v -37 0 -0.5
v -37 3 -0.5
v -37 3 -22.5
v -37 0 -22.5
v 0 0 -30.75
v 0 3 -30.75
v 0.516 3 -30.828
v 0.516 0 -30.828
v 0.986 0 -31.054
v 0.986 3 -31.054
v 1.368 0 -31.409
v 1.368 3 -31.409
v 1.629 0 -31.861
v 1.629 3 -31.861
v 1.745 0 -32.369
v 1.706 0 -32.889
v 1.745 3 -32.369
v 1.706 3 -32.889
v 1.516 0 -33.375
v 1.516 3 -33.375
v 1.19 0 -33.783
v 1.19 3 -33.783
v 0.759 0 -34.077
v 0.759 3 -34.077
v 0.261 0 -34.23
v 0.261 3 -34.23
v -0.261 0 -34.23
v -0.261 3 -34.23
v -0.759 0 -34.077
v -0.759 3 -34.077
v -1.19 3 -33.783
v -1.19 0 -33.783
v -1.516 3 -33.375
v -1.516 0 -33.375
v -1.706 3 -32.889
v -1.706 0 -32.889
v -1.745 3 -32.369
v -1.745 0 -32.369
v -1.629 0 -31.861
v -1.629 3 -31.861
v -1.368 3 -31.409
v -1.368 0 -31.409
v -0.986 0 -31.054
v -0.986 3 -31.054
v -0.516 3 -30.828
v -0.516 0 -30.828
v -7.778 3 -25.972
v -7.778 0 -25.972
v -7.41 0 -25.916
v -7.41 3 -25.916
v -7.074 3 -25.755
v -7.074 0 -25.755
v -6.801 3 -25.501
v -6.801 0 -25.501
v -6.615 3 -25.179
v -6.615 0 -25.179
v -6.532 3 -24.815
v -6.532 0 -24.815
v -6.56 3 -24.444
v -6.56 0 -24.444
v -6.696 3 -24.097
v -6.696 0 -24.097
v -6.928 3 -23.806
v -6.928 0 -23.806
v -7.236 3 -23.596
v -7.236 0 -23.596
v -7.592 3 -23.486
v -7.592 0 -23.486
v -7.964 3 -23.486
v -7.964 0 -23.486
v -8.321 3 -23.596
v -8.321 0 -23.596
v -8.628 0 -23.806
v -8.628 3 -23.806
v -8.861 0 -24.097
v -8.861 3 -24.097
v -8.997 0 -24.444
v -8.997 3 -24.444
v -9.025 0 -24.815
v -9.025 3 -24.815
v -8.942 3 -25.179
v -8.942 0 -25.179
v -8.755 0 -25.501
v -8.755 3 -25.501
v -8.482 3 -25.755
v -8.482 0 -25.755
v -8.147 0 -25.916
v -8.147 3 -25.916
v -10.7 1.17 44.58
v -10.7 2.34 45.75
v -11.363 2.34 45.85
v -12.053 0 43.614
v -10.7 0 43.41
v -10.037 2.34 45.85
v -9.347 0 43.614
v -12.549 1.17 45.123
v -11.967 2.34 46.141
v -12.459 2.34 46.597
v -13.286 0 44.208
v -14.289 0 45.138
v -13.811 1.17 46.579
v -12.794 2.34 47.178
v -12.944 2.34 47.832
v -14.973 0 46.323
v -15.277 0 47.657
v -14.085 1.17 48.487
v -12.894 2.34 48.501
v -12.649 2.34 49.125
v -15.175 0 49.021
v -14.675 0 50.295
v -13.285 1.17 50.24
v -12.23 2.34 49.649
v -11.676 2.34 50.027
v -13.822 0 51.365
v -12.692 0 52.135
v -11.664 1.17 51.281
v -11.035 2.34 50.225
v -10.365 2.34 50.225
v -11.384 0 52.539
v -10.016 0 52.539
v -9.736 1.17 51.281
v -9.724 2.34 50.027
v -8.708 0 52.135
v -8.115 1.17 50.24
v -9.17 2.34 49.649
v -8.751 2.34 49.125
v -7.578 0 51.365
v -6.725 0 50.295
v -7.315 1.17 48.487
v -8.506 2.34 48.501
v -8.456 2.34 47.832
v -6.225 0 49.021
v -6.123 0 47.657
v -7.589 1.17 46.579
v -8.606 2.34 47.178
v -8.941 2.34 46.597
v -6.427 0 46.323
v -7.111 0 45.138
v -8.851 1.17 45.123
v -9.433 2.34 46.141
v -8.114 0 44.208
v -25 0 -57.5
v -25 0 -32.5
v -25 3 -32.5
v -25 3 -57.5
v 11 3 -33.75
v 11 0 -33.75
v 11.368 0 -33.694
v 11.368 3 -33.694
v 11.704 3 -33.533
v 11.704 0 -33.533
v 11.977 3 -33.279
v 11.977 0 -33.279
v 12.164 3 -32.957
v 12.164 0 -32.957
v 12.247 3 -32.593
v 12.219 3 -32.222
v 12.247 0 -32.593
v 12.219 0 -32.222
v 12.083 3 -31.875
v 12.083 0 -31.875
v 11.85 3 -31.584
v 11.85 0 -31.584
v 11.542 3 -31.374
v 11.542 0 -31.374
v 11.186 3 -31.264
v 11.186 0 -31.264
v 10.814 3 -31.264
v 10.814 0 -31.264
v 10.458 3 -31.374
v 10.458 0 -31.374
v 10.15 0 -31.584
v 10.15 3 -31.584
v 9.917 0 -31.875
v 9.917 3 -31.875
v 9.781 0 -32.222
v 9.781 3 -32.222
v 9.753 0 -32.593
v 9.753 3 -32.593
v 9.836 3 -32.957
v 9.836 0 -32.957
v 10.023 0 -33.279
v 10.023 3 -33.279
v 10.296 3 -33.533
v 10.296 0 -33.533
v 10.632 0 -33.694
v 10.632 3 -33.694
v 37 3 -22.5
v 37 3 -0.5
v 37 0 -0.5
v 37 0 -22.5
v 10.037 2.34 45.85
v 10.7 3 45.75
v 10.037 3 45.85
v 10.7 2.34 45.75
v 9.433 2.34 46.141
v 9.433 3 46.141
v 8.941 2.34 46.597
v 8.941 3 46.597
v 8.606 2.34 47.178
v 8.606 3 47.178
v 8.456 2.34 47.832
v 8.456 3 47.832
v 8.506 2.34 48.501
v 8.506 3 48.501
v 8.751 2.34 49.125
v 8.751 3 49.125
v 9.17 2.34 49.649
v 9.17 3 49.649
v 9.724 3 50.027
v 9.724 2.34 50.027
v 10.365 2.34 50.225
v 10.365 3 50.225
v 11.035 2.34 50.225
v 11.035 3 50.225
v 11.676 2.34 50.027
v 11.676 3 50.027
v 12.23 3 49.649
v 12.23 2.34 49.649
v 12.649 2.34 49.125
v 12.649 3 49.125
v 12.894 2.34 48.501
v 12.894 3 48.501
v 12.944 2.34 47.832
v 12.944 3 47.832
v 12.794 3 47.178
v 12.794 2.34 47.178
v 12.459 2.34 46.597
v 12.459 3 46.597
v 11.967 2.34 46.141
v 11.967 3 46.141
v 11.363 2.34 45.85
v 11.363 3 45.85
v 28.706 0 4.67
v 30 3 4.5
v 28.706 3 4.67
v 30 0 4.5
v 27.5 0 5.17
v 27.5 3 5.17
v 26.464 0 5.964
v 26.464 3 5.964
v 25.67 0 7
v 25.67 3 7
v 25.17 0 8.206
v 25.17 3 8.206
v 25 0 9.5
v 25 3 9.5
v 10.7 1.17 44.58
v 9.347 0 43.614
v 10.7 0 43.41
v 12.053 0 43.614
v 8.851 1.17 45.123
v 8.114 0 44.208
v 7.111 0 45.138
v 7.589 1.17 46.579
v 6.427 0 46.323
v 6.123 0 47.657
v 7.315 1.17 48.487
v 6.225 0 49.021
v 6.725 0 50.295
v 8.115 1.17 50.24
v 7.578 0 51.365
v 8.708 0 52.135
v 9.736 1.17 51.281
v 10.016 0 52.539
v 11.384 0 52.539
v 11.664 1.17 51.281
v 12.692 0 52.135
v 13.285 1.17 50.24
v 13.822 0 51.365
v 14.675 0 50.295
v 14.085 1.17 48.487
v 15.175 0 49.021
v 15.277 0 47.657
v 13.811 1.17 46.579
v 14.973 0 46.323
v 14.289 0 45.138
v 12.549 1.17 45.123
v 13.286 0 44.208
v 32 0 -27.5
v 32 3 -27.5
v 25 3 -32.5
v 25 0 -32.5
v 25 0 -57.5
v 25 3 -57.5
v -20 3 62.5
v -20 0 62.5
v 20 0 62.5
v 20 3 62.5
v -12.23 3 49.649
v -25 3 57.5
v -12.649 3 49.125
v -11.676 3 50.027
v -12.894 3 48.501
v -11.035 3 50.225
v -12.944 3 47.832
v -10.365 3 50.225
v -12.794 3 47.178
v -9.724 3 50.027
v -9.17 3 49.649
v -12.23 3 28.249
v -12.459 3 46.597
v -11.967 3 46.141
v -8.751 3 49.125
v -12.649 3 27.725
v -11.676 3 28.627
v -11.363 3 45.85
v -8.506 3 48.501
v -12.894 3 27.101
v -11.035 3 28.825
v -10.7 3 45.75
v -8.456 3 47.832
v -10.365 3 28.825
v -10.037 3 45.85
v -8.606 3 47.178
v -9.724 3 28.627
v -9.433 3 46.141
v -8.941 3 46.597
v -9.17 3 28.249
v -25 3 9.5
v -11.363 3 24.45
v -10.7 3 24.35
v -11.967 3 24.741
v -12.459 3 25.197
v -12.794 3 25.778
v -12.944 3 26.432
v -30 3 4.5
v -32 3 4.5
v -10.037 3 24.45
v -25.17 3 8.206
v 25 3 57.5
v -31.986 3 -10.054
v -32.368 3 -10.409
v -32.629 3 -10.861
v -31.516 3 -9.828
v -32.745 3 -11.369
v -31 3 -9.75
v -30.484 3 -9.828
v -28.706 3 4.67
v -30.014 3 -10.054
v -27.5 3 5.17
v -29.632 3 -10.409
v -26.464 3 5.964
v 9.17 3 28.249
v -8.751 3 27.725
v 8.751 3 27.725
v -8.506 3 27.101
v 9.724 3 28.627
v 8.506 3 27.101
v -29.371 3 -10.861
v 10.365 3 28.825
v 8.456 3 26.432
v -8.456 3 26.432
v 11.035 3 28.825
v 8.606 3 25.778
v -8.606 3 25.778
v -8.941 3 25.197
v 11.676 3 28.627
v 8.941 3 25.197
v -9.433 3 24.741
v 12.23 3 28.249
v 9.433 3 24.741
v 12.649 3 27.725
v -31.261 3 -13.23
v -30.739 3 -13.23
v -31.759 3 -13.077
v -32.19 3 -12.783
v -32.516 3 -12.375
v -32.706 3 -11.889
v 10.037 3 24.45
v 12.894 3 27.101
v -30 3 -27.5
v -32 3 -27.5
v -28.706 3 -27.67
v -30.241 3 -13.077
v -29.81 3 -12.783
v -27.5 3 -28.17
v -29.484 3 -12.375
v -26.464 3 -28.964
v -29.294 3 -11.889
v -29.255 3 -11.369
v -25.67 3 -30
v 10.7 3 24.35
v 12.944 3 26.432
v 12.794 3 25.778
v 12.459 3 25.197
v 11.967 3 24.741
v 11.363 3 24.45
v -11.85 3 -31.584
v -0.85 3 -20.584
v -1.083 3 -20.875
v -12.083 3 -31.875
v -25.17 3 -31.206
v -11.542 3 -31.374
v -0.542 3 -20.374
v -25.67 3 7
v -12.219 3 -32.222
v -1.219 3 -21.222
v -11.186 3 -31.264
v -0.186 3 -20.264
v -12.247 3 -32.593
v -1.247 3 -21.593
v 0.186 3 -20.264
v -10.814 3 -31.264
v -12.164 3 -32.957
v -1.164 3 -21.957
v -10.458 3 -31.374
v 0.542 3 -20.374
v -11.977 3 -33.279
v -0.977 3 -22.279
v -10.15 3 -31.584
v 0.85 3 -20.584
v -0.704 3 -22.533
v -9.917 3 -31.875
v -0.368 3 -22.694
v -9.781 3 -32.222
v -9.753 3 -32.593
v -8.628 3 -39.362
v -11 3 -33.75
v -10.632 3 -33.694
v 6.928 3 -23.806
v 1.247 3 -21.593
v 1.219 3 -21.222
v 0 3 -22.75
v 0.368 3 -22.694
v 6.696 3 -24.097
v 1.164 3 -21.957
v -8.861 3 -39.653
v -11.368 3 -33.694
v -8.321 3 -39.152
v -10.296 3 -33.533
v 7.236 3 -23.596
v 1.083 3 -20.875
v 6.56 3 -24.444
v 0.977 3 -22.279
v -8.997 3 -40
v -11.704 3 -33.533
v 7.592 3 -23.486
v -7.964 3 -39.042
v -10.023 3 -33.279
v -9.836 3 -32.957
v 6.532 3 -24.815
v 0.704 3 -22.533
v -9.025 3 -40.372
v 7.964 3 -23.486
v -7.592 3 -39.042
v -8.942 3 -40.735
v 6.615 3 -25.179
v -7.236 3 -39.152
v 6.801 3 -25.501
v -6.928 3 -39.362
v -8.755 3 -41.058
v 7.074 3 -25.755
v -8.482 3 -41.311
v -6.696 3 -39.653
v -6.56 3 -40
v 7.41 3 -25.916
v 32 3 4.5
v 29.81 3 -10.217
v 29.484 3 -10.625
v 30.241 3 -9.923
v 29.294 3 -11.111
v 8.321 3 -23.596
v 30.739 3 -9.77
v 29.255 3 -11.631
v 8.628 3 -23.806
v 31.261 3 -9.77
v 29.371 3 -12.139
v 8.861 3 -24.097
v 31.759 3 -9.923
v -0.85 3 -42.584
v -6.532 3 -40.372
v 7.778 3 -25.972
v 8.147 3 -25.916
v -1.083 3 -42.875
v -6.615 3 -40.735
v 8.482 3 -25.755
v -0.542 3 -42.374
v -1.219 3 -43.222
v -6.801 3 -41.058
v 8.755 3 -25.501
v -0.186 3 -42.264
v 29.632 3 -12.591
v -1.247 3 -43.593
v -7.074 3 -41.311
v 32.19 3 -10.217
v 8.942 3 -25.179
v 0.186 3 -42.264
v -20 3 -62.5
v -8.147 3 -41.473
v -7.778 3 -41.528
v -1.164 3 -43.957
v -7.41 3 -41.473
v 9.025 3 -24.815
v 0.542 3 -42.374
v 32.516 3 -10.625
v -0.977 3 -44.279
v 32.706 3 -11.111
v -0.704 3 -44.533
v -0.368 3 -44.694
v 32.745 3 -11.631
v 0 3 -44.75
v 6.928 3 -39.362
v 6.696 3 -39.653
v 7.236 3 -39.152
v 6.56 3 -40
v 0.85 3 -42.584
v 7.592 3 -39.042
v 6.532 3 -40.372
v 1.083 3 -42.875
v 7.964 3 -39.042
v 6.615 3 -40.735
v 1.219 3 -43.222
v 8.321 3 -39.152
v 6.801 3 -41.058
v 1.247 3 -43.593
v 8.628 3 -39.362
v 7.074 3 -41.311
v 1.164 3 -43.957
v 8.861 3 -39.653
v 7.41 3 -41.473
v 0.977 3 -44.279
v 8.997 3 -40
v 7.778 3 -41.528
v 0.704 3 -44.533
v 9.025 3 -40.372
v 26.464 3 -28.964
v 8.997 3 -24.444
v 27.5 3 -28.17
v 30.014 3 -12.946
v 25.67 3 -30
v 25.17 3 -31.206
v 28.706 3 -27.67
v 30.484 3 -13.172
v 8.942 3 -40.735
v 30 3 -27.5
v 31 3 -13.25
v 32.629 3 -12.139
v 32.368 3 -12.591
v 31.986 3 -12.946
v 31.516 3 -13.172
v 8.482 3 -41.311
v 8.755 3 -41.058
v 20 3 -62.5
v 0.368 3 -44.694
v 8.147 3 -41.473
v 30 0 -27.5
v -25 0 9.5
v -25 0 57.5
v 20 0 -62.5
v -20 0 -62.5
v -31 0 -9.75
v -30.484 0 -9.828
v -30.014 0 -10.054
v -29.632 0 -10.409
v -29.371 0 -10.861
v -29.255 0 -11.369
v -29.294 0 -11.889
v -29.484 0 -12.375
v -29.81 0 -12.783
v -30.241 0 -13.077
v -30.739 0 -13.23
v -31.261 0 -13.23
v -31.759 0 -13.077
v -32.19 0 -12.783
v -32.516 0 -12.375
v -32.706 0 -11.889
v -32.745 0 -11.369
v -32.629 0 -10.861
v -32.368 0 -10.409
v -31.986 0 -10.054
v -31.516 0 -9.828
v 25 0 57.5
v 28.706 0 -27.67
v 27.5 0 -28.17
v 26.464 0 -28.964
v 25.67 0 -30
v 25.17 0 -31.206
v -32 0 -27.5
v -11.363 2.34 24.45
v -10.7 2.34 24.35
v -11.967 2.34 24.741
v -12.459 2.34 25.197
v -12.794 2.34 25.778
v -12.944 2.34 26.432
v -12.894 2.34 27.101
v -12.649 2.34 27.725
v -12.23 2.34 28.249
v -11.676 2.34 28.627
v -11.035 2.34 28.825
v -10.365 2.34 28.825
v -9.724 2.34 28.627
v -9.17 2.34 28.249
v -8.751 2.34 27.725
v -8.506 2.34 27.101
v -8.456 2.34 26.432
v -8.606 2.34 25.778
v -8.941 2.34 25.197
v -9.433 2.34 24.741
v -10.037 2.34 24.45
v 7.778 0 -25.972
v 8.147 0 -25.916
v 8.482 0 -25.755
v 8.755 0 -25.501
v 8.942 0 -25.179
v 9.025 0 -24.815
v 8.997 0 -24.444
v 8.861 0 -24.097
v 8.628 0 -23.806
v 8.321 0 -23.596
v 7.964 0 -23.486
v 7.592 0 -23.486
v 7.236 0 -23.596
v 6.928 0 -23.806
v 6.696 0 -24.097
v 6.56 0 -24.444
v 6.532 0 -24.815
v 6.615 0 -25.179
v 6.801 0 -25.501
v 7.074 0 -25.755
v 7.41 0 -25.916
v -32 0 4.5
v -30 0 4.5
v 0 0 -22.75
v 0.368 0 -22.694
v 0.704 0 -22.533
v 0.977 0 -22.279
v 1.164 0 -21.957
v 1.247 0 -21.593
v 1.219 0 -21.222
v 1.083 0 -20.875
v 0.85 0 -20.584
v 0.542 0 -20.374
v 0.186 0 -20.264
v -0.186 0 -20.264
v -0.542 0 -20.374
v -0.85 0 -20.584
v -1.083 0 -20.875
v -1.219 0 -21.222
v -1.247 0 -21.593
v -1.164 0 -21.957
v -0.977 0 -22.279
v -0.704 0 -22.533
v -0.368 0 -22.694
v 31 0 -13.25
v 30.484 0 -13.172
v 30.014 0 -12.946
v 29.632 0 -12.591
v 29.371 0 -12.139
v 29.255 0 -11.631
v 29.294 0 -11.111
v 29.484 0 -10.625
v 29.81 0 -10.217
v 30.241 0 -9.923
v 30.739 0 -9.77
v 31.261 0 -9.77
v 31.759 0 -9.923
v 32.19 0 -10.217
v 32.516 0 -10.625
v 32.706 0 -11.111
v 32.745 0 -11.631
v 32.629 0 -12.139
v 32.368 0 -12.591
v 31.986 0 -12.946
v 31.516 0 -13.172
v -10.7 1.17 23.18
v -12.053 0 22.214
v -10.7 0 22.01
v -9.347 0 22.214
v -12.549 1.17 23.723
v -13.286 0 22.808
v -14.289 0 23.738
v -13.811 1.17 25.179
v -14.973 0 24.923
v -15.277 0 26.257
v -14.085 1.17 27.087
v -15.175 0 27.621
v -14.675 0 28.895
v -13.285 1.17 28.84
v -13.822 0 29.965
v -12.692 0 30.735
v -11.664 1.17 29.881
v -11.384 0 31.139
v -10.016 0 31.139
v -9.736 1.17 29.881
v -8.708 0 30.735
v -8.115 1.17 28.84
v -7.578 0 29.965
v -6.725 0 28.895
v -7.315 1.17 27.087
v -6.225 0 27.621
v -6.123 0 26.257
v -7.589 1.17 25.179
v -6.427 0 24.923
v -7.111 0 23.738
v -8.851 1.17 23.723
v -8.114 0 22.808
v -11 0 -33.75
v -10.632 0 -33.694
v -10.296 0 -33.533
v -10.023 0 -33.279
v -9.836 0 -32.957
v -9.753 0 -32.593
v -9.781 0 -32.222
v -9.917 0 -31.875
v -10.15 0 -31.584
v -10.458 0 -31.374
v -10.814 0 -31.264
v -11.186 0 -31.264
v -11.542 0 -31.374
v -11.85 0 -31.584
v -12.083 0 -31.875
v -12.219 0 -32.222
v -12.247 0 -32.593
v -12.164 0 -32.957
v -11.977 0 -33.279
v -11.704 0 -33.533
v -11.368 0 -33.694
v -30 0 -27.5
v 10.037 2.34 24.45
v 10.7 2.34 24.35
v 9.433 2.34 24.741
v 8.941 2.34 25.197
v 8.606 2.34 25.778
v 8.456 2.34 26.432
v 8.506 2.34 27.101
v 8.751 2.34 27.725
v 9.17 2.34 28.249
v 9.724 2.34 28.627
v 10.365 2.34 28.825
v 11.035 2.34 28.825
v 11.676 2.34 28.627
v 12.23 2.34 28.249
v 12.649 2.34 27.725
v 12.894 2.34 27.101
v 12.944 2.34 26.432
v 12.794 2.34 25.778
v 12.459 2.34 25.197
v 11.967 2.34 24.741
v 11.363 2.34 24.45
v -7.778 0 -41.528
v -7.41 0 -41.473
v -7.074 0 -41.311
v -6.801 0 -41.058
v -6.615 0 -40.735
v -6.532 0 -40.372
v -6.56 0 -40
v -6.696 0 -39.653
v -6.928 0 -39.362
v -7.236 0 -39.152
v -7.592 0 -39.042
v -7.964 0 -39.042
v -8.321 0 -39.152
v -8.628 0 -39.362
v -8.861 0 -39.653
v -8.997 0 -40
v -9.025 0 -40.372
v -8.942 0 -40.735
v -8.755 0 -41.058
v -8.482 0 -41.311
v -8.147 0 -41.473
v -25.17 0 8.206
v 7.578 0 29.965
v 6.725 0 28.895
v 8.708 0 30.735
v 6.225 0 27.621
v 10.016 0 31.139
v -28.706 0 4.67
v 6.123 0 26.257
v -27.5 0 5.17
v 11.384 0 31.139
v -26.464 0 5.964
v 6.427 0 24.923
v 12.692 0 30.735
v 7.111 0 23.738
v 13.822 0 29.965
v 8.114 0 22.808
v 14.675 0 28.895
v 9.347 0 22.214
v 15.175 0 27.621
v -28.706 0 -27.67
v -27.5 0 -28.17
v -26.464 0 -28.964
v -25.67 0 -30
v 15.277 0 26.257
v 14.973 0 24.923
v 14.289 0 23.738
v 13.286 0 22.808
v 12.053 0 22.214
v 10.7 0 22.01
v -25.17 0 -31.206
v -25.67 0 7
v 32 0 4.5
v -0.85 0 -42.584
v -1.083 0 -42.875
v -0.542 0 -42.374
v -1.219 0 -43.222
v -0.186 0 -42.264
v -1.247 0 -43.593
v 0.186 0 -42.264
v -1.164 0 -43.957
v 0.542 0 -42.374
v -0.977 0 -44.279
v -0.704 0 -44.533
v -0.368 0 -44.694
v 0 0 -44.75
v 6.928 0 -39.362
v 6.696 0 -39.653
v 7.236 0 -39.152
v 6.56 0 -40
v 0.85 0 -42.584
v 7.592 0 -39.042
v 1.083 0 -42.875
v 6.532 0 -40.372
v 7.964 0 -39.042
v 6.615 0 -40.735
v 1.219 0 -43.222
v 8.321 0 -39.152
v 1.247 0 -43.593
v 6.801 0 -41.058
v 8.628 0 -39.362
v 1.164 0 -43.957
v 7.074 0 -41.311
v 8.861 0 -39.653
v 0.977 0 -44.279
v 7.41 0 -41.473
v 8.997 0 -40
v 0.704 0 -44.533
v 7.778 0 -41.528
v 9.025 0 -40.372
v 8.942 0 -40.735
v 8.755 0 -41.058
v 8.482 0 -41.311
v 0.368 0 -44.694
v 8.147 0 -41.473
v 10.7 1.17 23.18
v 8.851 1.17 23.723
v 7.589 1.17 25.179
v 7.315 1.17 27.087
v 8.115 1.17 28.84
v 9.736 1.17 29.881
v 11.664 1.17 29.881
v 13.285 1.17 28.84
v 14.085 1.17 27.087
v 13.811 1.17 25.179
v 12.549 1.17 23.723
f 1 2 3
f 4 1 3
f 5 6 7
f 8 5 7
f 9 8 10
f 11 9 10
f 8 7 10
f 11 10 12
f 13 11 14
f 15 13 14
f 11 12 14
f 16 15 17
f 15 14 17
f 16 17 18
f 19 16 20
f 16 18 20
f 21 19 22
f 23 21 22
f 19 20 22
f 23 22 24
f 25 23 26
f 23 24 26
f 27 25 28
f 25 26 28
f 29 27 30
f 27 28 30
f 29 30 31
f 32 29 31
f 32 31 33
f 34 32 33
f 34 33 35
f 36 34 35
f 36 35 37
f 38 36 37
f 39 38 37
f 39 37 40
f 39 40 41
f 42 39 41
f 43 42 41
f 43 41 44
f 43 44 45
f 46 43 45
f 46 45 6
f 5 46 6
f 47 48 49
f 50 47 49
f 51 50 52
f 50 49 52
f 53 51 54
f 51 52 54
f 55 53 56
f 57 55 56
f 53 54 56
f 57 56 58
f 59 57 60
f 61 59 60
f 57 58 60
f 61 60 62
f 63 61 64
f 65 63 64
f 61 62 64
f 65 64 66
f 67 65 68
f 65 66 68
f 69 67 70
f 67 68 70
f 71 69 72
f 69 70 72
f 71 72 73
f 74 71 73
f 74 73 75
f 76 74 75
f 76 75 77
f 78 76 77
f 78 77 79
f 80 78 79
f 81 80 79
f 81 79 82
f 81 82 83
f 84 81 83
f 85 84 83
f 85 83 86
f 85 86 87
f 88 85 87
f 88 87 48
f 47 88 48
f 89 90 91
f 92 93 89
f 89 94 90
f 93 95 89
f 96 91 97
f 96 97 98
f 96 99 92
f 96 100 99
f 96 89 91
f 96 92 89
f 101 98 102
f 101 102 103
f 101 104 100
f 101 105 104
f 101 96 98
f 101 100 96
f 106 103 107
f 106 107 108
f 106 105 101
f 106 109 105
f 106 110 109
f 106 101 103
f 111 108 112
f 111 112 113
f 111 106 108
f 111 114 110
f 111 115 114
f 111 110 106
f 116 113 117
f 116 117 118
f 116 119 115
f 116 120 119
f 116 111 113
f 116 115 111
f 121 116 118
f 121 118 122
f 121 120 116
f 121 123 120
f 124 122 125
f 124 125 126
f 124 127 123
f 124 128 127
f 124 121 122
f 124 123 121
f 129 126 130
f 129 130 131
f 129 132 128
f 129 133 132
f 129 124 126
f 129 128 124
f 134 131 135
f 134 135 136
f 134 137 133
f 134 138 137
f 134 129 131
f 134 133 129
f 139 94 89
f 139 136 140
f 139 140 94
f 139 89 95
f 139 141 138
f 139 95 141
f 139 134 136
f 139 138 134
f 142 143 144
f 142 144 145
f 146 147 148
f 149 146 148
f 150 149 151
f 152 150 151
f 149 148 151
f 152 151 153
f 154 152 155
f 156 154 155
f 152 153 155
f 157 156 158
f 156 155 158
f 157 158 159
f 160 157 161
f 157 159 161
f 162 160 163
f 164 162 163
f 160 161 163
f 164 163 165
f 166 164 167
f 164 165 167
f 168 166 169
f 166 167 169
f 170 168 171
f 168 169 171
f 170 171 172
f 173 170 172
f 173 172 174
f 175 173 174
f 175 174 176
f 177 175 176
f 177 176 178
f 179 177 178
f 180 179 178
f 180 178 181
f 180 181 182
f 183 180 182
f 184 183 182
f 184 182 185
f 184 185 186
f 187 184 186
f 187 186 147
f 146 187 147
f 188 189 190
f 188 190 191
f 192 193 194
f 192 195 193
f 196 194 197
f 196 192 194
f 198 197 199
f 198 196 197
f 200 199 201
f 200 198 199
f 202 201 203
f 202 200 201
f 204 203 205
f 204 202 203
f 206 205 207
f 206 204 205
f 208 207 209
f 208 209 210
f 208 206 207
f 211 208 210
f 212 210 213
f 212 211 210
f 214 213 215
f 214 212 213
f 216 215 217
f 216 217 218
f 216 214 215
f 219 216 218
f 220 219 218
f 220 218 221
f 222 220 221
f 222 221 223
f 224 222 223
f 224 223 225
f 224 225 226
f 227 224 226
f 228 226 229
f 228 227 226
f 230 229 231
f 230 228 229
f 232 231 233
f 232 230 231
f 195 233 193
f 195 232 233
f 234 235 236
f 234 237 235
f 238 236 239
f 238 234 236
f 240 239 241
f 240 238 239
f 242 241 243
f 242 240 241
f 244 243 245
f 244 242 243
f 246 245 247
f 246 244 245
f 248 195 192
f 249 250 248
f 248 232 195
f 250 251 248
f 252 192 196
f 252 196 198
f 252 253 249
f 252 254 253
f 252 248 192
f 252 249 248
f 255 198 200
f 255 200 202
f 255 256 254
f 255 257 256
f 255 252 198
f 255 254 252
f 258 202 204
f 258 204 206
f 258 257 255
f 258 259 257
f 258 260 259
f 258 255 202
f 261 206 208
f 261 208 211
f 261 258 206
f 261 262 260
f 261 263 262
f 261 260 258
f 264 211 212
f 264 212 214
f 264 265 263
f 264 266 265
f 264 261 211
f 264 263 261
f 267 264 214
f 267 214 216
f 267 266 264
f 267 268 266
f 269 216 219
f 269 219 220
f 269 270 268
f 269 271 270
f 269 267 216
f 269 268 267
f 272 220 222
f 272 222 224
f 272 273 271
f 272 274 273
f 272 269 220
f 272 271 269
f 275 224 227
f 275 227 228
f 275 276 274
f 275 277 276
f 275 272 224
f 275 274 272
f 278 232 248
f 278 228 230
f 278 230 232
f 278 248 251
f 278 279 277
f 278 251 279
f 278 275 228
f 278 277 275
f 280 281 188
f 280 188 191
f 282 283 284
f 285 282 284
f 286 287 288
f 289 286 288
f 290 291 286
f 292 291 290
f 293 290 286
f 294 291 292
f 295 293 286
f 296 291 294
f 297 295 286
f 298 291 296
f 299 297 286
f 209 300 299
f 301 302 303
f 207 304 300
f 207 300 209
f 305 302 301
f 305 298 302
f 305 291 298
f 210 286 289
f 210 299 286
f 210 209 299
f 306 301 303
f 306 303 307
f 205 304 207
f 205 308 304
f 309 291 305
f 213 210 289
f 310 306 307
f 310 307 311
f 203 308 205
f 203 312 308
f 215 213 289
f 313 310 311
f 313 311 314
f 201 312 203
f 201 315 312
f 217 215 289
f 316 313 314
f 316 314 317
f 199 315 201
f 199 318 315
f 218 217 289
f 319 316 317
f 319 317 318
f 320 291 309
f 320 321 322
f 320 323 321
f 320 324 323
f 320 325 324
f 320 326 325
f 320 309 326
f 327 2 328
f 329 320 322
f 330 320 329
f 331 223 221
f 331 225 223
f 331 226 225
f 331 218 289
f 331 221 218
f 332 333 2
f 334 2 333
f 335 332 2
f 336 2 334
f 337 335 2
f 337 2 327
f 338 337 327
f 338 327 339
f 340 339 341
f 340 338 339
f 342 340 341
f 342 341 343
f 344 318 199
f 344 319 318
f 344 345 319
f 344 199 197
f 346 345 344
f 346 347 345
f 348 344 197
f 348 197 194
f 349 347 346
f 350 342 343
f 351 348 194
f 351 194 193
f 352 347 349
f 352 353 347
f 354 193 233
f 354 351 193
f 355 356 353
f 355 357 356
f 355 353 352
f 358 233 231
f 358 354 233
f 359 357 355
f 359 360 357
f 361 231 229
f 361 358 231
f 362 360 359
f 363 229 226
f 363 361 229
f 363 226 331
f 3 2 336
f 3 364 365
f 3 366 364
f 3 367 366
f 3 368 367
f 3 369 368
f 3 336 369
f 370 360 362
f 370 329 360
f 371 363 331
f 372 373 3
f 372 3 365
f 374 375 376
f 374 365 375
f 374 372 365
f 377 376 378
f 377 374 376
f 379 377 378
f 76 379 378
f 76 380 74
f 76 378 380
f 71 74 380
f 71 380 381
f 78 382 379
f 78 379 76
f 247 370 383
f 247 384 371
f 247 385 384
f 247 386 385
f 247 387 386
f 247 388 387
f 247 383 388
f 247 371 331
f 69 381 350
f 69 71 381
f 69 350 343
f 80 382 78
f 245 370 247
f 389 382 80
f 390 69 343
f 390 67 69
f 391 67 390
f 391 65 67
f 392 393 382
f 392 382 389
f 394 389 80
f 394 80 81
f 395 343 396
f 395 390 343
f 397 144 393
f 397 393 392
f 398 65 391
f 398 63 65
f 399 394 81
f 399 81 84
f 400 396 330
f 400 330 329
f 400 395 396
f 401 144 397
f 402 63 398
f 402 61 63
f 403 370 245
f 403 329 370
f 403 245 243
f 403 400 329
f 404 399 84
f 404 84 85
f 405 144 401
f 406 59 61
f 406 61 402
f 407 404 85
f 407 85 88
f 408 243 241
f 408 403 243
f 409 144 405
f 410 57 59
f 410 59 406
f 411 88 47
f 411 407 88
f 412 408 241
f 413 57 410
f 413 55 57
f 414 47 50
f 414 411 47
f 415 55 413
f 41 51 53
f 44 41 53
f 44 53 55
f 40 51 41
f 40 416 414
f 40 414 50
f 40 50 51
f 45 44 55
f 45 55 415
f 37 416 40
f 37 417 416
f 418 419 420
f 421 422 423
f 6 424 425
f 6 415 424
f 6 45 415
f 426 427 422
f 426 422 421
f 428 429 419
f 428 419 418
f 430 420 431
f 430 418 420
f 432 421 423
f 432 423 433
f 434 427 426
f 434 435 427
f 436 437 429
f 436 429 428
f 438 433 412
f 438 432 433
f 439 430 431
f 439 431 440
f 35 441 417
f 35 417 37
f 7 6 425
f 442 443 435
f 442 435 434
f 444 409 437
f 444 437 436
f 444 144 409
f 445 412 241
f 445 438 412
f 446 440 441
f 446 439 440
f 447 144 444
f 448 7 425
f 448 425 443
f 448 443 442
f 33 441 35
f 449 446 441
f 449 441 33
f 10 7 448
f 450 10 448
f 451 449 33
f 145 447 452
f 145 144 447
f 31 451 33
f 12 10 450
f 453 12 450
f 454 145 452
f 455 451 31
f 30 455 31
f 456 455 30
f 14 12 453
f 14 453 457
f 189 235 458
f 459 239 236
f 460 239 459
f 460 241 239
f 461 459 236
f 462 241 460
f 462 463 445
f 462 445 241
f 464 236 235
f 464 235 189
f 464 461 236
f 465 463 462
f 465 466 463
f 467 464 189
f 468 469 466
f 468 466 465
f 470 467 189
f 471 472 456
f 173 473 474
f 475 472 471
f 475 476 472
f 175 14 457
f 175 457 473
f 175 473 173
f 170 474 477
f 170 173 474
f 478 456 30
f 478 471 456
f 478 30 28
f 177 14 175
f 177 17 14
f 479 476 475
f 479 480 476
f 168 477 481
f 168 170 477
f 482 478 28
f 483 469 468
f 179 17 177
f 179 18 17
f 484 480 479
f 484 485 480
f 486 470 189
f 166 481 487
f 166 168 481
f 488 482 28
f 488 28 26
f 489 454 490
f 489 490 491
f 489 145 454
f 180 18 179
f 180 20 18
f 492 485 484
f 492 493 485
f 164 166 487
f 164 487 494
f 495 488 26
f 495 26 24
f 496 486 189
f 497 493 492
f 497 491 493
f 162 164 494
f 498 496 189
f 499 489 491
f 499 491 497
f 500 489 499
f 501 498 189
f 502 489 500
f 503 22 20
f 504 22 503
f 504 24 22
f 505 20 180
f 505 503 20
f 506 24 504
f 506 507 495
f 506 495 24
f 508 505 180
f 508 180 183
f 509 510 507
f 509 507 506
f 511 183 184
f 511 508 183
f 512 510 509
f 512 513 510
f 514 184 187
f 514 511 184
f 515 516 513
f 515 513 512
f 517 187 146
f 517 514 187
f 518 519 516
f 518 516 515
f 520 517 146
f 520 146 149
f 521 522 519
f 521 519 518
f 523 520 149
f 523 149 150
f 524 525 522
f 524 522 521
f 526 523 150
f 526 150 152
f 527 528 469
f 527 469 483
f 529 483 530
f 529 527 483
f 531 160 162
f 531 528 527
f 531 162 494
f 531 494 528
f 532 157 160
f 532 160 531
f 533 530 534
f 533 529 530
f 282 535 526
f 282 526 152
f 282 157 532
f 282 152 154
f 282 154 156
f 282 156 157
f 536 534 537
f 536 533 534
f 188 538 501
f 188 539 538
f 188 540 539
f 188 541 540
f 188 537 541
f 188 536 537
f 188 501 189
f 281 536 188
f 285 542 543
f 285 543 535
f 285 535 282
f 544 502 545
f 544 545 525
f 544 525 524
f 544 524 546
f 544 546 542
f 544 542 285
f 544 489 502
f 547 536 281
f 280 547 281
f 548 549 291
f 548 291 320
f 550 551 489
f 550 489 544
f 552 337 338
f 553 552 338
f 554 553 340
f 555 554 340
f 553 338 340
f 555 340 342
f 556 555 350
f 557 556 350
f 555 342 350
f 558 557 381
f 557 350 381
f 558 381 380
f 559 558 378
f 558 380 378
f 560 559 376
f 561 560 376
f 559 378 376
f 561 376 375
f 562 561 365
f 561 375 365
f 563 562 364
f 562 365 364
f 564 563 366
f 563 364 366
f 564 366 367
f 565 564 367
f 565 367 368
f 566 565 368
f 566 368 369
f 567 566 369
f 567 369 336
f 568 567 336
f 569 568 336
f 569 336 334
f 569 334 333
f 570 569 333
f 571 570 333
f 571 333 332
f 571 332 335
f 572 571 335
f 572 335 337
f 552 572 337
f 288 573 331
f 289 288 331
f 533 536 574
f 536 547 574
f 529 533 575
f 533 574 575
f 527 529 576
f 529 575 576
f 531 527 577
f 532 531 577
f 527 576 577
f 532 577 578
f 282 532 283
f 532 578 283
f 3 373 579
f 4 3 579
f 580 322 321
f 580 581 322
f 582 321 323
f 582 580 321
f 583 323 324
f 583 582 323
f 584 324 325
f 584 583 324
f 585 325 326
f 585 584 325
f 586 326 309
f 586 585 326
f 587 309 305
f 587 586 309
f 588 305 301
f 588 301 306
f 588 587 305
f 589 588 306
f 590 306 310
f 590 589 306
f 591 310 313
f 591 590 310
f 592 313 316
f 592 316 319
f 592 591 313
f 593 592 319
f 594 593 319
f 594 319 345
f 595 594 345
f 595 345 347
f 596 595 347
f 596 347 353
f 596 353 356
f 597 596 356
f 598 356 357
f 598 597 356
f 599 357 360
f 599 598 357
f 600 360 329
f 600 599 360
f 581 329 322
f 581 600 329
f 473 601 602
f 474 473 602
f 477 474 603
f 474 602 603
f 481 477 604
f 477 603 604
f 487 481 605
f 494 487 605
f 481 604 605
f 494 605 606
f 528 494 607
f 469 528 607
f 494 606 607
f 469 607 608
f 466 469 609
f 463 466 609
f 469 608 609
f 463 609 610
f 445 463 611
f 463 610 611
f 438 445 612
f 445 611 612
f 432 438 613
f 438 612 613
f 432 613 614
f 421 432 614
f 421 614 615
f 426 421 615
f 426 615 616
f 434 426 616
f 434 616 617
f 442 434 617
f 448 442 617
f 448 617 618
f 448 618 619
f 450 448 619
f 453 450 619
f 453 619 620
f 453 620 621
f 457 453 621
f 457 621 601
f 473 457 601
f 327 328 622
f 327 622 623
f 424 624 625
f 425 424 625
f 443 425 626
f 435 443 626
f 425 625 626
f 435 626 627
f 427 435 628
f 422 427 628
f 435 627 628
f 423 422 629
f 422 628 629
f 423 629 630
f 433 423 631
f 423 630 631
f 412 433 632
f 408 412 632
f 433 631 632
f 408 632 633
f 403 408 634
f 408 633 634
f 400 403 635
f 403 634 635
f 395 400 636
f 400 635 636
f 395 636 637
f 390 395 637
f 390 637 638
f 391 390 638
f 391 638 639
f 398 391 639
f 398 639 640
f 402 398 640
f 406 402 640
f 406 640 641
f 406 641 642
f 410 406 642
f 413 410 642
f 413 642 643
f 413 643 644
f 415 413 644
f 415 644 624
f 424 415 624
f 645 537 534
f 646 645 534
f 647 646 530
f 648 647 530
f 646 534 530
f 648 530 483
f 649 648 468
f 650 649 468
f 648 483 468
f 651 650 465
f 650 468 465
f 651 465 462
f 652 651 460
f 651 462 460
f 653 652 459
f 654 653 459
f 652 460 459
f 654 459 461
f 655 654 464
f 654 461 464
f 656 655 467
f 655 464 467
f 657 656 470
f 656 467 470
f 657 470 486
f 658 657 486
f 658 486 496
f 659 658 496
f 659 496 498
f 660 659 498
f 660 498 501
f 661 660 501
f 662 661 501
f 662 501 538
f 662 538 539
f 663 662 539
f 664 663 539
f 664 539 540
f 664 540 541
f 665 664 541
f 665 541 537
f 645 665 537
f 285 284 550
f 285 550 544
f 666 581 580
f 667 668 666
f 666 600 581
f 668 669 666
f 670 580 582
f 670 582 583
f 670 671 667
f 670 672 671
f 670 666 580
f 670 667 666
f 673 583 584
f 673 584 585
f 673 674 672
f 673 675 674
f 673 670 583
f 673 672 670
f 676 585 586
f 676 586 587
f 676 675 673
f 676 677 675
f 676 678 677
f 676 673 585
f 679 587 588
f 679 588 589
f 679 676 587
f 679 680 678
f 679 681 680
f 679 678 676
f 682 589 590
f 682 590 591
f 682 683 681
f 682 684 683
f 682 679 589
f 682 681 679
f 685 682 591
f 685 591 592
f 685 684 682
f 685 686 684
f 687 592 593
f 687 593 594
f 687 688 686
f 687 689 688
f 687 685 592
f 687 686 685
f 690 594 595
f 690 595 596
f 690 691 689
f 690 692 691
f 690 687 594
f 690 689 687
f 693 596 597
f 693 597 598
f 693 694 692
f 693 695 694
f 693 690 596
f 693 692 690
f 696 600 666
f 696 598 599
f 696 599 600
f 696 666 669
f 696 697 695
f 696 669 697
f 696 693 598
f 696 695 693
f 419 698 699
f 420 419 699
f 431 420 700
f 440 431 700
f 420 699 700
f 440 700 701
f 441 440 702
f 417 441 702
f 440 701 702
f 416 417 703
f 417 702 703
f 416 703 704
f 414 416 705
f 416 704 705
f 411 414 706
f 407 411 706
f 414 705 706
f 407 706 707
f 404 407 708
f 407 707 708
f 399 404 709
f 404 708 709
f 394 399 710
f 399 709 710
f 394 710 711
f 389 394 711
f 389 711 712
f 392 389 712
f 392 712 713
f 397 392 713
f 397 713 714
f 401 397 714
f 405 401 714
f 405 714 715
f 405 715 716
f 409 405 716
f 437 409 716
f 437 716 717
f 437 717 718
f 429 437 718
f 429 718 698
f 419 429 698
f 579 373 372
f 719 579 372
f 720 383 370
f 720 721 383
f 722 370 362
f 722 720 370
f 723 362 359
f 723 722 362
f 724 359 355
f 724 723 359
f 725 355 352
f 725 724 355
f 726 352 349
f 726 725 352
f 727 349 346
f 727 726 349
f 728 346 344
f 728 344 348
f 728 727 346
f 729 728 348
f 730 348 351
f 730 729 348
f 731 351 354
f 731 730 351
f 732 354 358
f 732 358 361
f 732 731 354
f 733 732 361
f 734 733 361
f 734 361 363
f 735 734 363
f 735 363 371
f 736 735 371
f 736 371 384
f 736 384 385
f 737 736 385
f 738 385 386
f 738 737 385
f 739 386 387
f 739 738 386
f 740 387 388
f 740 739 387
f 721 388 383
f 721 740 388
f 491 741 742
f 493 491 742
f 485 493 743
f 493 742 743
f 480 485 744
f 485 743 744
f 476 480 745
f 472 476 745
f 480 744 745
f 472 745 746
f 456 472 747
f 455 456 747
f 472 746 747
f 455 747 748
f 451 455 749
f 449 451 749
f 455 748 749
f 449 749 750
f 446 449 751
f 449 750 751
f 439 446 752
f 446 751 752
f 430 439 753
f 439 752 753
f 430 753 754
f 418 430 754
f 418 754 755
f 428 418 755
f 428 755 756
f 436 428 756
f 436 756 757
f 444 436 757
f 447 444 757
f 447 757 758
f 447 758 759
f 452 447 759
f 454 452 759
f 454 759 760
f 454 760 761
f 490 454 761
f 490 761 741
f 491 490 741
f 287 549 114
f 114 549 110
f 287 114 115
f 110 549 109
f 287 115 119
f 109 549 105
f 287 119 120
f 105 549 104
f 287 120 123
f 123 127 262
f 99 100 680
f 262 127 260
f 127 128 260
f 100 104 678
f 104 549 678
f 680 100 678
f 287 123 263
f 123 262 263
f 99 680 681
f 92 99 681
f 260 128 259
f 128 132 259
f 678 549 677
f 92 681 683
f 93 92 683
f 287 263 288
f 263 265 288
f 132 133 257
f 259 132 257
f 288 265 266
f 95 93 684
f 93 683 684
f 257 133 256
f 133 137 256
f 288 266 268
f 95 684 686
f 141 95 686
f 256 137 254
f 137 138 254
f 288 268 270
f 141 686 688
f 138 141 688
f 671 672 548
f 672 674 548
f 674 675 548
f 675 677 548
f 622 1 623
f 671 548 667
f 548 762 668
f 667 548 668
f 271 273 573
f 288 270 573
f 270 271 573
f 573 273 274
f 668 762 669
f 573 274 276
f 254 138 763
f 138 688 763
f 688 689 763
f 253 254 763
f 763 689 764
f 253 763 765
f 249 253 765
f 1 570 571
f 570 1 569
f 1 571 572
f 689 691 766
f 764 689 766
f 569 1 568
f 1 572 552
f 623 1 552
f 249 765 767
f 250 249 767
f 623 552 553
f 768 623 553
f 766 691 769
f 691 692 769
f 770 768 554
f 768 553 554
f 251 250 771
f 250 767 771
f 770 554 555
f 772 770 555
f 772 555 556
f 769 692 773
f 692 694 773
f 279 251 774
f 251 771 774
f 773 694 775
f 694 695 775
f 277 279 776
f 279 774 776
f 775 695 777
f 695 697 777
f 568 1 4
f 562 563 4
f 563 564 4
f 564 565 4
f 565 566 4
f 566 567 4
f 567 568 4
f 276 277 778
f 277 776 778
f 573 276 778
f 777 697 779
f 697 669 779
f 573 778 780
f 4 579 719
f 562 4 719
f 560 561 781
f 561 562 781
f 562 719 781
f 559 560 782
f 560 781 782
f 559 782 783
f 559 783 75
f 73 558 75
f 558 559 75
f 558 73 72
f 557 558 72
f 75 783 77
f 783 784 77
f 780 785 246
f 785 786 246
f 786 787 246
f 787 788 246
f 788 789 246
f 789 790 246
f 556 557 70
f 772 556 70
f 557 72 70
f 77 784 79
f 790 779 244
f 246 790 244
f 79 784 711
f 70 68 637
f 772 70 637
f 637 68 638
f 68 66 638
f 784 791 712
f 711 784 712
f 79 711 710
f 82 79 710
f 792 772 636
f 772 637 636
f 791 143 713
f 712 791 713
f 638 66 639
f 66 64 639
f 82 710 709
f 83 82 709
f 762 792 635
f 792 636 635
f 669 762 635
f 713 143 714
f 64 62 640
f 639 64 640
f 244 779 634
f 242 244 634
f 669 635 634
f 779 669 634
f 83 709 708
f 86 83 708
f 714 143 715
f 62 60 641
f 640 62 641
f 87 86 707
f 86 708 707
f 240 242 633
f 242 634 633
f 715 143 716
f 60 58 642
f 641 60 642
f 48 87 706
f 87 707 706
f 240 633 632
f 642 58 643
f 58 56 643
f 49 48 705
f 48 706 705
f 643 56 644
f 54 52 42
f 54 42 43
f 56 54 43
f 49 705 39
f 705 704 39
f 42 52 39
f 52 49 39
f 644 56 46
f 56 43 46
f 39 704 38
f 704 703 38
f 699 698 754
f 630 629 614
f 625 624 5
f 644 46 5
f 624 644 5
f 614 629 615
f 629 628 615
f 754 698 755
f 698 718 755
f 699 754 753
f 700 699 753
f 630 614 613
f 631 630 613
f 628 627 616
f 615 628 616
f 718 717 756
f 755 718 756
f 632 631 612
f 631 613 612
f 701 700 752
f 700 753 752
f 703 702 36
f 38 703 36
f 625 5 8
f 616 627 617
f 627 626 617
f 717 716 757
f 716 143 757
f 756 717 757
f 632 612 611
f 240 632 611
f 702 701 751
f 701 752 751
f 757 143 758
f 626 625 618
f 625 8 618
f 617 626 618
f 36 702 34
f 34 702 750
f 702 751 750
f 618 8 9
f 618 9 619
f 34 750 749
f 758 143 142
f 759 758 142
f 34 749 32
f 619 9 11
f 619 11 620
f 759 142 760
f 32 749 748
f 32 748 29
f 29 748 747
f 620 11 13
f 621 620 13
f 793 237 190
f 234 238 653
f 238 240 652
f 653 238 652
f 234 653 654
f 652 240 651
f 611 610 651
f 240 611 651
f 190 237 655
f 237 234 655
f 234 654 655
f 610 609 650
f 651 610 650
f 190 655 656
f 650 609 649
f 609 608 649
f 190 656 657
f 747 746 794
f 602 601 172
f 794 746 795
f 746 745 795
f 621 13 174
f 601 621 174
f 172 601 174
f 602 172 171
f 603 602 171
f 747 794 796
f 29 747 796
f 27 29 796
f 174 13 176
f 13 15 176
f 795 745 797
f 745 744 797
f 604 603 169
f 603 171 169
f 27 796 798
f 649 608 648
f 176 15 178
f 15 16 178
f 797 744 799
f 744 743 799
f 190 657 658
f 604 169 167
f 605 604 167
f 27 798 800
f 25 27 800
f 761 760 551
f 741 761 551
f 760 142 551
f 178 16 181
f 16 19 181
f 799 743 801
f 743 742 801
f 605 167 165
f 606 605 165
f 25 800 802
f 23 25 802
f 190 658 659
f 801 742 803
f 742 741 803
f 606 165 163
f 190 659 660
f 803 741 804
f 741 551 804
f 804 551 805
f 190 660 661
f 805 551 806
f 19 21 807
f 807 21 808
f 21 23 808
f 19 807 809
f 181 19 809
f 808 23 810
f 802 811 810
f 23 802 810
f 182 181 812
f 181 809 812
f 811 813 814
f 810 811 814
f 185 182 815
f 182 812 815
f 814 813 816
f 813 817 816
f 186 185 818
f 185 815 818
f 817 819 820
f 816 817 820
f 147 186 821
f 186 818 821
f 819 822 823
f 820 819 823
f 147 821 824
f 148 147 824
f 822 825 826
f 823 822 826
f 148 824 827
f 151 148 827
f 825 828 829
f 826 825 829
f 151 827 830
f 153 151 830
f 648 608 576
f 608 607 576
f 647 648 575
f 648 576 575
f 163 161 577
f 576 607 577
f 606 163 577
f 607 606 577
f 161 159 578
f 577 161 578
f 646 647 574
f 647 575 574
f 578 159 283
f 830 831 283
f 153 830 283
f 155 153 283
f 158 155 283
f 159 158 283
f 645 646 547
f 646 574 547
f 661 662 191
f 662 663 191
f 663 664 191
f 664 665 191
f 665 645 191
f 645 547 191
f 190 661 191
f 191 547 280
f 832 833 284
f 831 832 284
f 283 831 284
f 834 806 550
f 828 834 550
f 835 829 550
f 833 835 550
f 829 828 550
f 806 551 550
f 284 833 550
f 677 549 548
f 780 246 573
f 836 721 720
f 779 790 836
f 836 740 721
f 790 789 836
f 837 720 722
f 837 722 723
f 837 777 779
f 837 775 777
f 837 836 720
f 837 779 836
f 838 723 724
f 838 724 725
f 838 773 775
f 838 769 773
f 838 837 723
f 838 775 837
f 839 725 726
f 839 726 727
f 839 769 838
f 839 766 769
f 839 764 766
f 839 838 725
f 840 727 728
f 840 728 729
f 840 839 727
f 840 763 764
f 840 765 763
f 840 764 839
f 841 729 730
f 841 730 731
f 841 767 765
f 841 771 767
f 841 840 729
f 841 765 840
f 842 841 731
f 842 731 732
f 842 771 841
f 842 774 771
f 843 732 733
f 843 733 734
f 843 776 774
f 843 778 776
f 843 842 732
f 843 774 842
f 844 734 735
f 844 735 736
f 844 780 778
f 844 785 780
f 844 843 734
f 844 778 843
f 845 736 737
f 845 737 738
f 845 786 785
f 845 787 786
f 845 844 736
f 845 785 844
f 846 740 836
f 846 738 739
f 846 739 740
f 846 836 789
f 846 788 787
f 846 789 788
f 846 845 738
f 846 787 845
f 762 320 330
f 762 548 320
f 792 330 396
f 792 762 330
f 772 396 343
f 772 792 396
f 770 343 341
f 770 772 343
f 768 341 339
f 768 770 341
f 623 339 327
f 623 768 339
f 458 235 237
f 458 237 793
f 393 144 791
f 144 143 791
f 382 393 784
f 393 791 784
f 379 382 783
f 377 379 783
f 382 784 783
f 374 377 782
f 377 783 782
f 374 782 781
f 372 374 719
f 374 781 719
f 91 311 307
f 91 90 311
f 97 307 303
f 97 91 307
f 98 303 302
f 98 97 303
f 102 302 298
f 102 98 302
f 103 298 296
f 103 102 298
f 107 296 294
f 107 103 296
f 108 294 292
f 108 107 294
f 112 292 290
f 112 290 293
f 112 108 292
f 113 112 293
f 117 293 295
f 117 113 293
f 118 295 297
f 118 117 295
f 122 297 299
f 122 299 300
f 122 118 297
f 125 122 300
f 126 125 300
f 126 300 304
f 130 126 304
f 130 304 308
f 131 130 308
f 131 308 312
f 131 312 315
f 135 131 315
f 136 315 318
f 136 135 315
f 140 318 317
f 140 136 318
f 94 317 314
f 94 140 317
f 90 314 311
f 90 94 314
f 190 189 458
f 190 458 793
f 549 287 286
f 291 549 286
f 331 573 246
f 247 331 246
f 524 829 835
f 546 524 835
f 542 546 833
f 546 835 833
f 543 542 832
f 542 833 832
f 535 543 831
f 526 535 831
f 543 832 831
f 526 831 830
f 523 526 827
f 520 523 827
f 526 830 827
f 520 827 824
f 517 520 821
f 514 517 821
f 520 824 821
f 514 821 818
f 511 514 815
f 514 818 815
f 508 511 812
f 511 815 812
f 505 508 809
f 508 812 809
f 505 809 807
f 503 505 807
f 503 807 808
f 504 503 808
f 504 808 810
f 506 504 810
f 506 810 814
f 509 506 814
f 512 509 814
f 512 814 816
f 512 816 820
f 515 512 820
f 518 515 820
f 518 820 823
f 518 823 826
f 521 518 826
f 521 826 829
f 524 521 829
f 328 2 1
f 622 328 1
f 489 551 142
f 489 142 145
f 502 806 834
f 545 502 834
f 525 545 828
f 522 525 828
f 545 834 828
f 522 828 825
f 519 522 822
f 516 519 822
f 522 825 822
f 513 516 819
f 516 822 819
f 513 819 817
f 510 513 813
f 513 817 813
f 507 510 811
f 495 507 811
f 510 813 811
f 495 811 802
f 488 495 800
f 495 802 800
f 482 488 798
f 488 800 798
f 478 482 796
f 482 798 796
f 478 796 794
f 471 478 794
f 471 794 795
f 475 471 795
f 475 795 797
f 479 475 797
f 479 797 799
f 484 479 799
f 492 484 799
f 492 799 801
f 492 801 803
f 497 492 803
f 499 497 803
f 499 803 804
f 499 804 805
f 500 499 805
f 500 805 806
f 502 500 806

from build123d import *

# Parameters (mm, degrees)
SKETCH1_W                                    = 50
SKETCH1_H                                    = 125
BOSS_EXTRUDE1_DEPTH                          = 3
SKETCH2_R                                    = 1.75
CUT_EXTRUDE1_DEPTH                           = 10
SKETCH14_R                                   = 2
CUT_EXTRUDE16_DEPTH                          = 10
CSK_FOR_M4_HEX_SOCKET_COUNTERSUNK_HE_2_COUNT = 2
CSK_FOR_M4_HEX_SOCKET_COUNTERSUNK_HE_2_PITCH = 21.4
CSK_FOR_M4_HEX_SOCKET_COUNTERSUNK_HE_3_COUNT = 2
CSK_FOR_M4_HEX_SOCKET_COUNTERSUNK_HE_3_PITCH = 30.264170235
CSK_FOR_M4_HEX_SOCKET_COUNTERSUNK_HE_4_COUNT = 2
CSK_FOR_M4_HEX_SOCKET_COUNTERSUNK_HE_4_PITCH = 21.4
CUT_EXTRUDE17_REACH                          = 69.381
SKETCH18_R                                   = 1.25
CHAMFER1_SIZE                                = 5
SKETCH19_W                                   = 12
SKETCH19_H                                   = 32
BOSS_EXTRUDE2_DEPTH                          = 3
CHAMFER2_SIZE                                = 5
FILLET1_R                                    = 5
SKETCH20_R                                   = 1.75
CUT_EXTRUDE18_DEPTH                          = 73.692846966


with BuildPart() as part:
    # Sketch1 → Boss-Extrude1 (new body)
    with BuildSketch(Plane(origin=(0, 0, 0), x_dir=(1, 0, 0), z_dir=(0, 1, 0))):
        Rectangle(SKETCH1_W, SKETCH1_H)
    extrude(amount=BOSS_EXTRUDE1_DEPTH)

    # Sketch2 → Cut-Extrude1 (cut)
    with BuildSketch(Plane(origin=(0, 3, 0), x_dir=(1, 0, 0), z_dir=(0, 1, 0))):
        with Locations(Location((0, 32.5, 0), (0, 0, 270))):
            Circle(SKETCH2_R)
    extrude(amount=-CUT_EXTRUDE1_DEPTH, mode=Mode.SUBTRACT)

    # Sketch14 → Cut-Extrude16 (cut)
    with BuildSketch(Plane(origin=(0, 3, 0), x_dir=(1, 0, 0), z_dir=(0, 1, 0))):
        with Locations(Location((-10.7, -26.6, 0), (0, 0, 270))):
            Circle(SKETCH14_R)
        with Locations(Location((10.7, -26.6, 0), (0, 0, 270))):
            Circle(SKETCH14_R)
        with Locations(Location((10.7, -48, 0), (0, 0, 270))):
            Circle(SKETCH14_R)
        with Locations(Location((-10.7, -48, 0), (0, 0, 270))):
            Circle(SKETCH14_R)
    extrude(amount=-CUT_EXTRUDE16_DEPTH, mode=Mode.SUBTRACT)

    # Sketch15 → CSK for M4 Hex Socket Countersunk Head Screw1 (revolve, cut)
    with BuildSketch(Plane(origin=(-10.7, 0, 26.6), x_dir=(0, 0, -1), z_dir=(1, 0, 0))):
        Polygon((0, 0), (0, 3), (2.25, 3), (2.25, 2.34), (4.59, 0), align=None)
    csk_for_m4_hex_socket_countersunk_head_s = revolve(axis=Axis((-10.7, -6.35, 26.6), (0, 1, 0)), mode=Mode.SUBTRACT)

    # CSK for M4 Hex Socket Countersunk He 2: CSK for M4 Hex Socket Countersunk Head Screw1 ×2
    with Locations(*[(i * CSK_FOR_M4_HEX_SOCKET_COUNTERSUNK_HE_2_PITCH, 0, 0) for i in range(1, CSK_FOR_M4_HEX_SOCKET_COUNTERSUNK_HE_2_COUNT)]):
        add(csk_for_m4_hex_socket_countersunk_head_s, mode=Mode.SUBTRACT)

    # CSK for M4 Hex Socket Countersunk He 3: CSK for M4 Hex Socket Countersunk Head Screw1 ×2
    with Locations(*[Vector(0.7071067811865474, 0, 0.7071067811865477) * (i * CSK_FOR_M4_HEX_SOCKET_COUNTERSUNK_HE_3_PITCH) for i in range(1, CSK_FOR_M4_HEX_SOCKET_COUNTERSUNK_HE_3_COUNT)]):
        add(csk_for_m4_hex_socket_countersunk_head_s, mode=Mode.SUBTRACT)

    # CSK for M4 Hex Socket Countersunk He 4: CSK for M4 Hex Socket Countersunk Head Screw1 ×2
    with Locations(*[(0, 0, i * CSK_FOR_M4_HEX_SOCKET_COUNTERSUNK_HE_4_PITCH) for i in range(1, CSK_FOR_M4_HEX_SOCKET_COUNTERSUNK_HE_4_COUNT)]):
        add(csk_for_m4_hex_socket_countersunk_head_s, mode=Mode.SUBTRACT)

    # Sketch18 → Cut-Extrude17 (cut, up to next)
    with BuildSketch(Plane.XZ, mode=Mode.PRIVATE) as cut_extrude17_sk1:
        with Locations(Location((0, -21.5, 0), (0, 0, 270))):
            Circle(SKETCH18_R)
    cut_extrude17_tool1 = extrude(cut_extrude17_sk1.sketch, amount=-CUT_EXTRUDE17_REACH, mode=Mode.PRIVATE) & part.part
    # Sketch18 → Cut-Extrude17 (cut, up to next)
    with BuildSketch(Plane.XZ, mode=Mode.PRIVATE) as cut_extrude17_sk2:
        with Locations(Location((0, -43.5, 0), (0, 0, 270))):
            Circle(SKETCH18_R)
    cut_extrude17_tool2 = extrude(cut_extrude17_sk2.sketch, amount=-CUT_EXTRUDE17_REACH, mode=Mode.PRIVATE) & part.part
    # Sketch18 → Cut-Extrude17 (cut, up to next)
    with BuildSketch(Plane.XZ, mode=Mode.PRIVATE) as cut_extrude17_sk3:
        with Locations(Location((-11, -32.5, 0), (0, 0, 270))):
            Circle(SKETCH18_R)
    cut_extrude17_tool3 = extrude(cut_extrude17_sk3.sketch, amount=-CUT_EXTRUDE17_REACH, mode=Mode.PRIVATE) & part.part
    # Sketch18 → Cut-Extrude17 (cut, up to next)
    with BuildSketch(Plane.XZ, mode=Mode.PRIVATE) as cut_extrude17_sk4:
        with Locations(Location((11, -32.5, 0), (0, 0, 270))):
            Circle(SKETCH18_R)
    cut_extrude17_tool4 = extrude(cut_extrude17_sk4.sketch, amount=-CUT_EXTRUDE17_REACH, mode=Mode.PRIVATE) & part.part
    # Sketch18 → Cut-Extrude17 (cut, up to next)
    with BuildSketch(Plane.XZ, mode=Mode.PRIVATE) as cut_extrude17_sk5:
        with Locations(Location((7.778174593, -24.721825407, 0), (0, 0, 270))):
            Circle(SKETCH18_R)
    cut_extrude17_tool5 = extrude(cut_extrude17_sk5.sketch, amount=-CUT_EXTRUDE17_REACH, mode=Mode.PRIVATE) & part.part
    # Sketch18 → Cut-Extrude17 (cut, up to next)
    with BuildSketch(Plane.XZ, mode=Mode.PRIVATE) as cut_extrude17_sk6:
        with Locations(Location((-7.778174593, -24.721825407, 0), (0, 0, 270))):
            Circle(SKETCH18_R)
    cut_extrude17_tool6 = extrude(cut_extrude17_sk6.sketch, amount=-CUT_EXTRUDE17_REACH, mode=Mode.PRIVATE) & part.part
    # Sketch18 → Cut-Extrude17 (cut, up to next)
    with BuildSketch(Plane.XZ, mode=Mode.PRIVATE) as cut_extrude17_sk7:
        with Locations(Location((-7.778174593, -40.278174593, 0), (0, 0, 270))):
            Circle(SKETCH18_R)
    cut_extrude17_tool7 = extrude(cut_extrude17_sk7.sketch, amount=-CUT_EXTRUDE17_REACH, mode=Mode.PRIVATE) & part.part
    # Sketch18 → Cut-Extrude17 (cut, up to next)
    with BuildSketch(Plane.XZ, mode=Mode.PRIVATE) as cut_extrude17_sk8:
        with Locations(Location((7.778174593, -40.278174593, 0), (0, 0, 270))):
            Circle(SKETCH18_R)
    cut_extrude17_tool8 = extrude(cut_extrude17_sk8.sketch, amount=-CUT_EXTRUDE17_REACH, mode=Mode.PRIVATE) & part.part
    add(cut_extrude17_tool1.solids().sort_by_distance((0, 0, -21.5))[0], mode=Mode.SUBTRACT)
    add(cut_extrude17_tool2.solids().sort_by_distance((0, 0, -43.5))[0], mode=Mode.SUBTRACT)
    add(cut_extrude17_tool3.solids().sort_by_distance((-11, 0, -32.5))[0], mode=Mode.SUBTRACT)
    add(cut_extrude17_tool4.solids().sort_by_distance((11, 0, -32.5))[0], mode=Mode.SUBTRACT)
    add(cut_extrude17_tool5.solids().sort_by_distance((7.778175, 0, -24.721825))[0], mode=Mode.SUBTRACT)
    add(cut_extrude17_tool6.solids().sort_by_distance((-7.778175, 0, -24.721825))[0], mode=Mode.SUBTRACT)
    add(cut_extrude17_tool7.solids().sort_by_distance((-7.778175, 0, -40.278175))[0], mode=Mode.SUBTRACT)
    add(cut_extrude17_tool8.solids().sort_by_distance((7.778175, 0, -40.278175))[0], mode=Mode.SUBTRACT)

    # Chamfer1
    chamfer1_edges = [part.edges().sort_by_distance(p)[0] for p in [
        (-25, 1.5, -62.5),
        (25, 1.5, -62.5),
        (25, 1.5, 62.5),
        (-25, 1.5, 62.5),
    ]]
    chamfer(chamfer1_edges, length=CHAMFER1_SIZE)

    # Sketch19 → Boss-Extrude2 (add)
    with BuildSketch(Plane(origin=(0, 3, 0), x_dir=(1, 0, 0), z_dir=(0, 1, 0))):
        with Locations((-31, 11.5)):
            Rectangle(SKETCH19_W, SKETCH19_H)
        with Locations((31, 11.5)):
            Rectangle(SKETCH19_W, SKETCH19_H)
    extrude(amount=-BOSS_EXTRUDE2_DEPTH)

    # Chamfer2
    chamfer2_edges = [part.edges().sort_by_distance(p)[0] for p in [
        (37, 1.5, -27.5),
        (37, 1.5, 4.5),
        (-37, 1.5, -27.5),
        (-37, 1.5, 4.5),
    ]]
    chamfer(chamfer2_edges, length=CHAMFER2_SIZE)

    # Fillet1
    fillet1_edges = [part.edges().sort_by_distance(p)[0] for p in [
        (-25, 1.5, -27.5),
        (-25, 1.5, 4.5),
        (25, 1.5, -27.5),
        (25, 1.5, 4.5),
    ]]
    fillet(fillet1_edges, radius=FILLET1_R)

    # Sketch20 → Cut-Extrude18 (cut, through all)
    with BuildSketch(Plane(origin=(0, 3, 0), x_dir=(1, 0, 0), z_dir=(0, 1, 0))):
        with Locations(Location((-31, 11.5, 0), (0, 0, 270))):
            Circle(SKETCH20_R)
        with Locations(Location((31, 11.5, 0), (0, 0, 90))):
            Circle(SKETCH20_R)
    extrude(amount=-CUT_EXTRUDE18_DEPTH, mode=Mode.SUBTRACT)


solid = part.part
